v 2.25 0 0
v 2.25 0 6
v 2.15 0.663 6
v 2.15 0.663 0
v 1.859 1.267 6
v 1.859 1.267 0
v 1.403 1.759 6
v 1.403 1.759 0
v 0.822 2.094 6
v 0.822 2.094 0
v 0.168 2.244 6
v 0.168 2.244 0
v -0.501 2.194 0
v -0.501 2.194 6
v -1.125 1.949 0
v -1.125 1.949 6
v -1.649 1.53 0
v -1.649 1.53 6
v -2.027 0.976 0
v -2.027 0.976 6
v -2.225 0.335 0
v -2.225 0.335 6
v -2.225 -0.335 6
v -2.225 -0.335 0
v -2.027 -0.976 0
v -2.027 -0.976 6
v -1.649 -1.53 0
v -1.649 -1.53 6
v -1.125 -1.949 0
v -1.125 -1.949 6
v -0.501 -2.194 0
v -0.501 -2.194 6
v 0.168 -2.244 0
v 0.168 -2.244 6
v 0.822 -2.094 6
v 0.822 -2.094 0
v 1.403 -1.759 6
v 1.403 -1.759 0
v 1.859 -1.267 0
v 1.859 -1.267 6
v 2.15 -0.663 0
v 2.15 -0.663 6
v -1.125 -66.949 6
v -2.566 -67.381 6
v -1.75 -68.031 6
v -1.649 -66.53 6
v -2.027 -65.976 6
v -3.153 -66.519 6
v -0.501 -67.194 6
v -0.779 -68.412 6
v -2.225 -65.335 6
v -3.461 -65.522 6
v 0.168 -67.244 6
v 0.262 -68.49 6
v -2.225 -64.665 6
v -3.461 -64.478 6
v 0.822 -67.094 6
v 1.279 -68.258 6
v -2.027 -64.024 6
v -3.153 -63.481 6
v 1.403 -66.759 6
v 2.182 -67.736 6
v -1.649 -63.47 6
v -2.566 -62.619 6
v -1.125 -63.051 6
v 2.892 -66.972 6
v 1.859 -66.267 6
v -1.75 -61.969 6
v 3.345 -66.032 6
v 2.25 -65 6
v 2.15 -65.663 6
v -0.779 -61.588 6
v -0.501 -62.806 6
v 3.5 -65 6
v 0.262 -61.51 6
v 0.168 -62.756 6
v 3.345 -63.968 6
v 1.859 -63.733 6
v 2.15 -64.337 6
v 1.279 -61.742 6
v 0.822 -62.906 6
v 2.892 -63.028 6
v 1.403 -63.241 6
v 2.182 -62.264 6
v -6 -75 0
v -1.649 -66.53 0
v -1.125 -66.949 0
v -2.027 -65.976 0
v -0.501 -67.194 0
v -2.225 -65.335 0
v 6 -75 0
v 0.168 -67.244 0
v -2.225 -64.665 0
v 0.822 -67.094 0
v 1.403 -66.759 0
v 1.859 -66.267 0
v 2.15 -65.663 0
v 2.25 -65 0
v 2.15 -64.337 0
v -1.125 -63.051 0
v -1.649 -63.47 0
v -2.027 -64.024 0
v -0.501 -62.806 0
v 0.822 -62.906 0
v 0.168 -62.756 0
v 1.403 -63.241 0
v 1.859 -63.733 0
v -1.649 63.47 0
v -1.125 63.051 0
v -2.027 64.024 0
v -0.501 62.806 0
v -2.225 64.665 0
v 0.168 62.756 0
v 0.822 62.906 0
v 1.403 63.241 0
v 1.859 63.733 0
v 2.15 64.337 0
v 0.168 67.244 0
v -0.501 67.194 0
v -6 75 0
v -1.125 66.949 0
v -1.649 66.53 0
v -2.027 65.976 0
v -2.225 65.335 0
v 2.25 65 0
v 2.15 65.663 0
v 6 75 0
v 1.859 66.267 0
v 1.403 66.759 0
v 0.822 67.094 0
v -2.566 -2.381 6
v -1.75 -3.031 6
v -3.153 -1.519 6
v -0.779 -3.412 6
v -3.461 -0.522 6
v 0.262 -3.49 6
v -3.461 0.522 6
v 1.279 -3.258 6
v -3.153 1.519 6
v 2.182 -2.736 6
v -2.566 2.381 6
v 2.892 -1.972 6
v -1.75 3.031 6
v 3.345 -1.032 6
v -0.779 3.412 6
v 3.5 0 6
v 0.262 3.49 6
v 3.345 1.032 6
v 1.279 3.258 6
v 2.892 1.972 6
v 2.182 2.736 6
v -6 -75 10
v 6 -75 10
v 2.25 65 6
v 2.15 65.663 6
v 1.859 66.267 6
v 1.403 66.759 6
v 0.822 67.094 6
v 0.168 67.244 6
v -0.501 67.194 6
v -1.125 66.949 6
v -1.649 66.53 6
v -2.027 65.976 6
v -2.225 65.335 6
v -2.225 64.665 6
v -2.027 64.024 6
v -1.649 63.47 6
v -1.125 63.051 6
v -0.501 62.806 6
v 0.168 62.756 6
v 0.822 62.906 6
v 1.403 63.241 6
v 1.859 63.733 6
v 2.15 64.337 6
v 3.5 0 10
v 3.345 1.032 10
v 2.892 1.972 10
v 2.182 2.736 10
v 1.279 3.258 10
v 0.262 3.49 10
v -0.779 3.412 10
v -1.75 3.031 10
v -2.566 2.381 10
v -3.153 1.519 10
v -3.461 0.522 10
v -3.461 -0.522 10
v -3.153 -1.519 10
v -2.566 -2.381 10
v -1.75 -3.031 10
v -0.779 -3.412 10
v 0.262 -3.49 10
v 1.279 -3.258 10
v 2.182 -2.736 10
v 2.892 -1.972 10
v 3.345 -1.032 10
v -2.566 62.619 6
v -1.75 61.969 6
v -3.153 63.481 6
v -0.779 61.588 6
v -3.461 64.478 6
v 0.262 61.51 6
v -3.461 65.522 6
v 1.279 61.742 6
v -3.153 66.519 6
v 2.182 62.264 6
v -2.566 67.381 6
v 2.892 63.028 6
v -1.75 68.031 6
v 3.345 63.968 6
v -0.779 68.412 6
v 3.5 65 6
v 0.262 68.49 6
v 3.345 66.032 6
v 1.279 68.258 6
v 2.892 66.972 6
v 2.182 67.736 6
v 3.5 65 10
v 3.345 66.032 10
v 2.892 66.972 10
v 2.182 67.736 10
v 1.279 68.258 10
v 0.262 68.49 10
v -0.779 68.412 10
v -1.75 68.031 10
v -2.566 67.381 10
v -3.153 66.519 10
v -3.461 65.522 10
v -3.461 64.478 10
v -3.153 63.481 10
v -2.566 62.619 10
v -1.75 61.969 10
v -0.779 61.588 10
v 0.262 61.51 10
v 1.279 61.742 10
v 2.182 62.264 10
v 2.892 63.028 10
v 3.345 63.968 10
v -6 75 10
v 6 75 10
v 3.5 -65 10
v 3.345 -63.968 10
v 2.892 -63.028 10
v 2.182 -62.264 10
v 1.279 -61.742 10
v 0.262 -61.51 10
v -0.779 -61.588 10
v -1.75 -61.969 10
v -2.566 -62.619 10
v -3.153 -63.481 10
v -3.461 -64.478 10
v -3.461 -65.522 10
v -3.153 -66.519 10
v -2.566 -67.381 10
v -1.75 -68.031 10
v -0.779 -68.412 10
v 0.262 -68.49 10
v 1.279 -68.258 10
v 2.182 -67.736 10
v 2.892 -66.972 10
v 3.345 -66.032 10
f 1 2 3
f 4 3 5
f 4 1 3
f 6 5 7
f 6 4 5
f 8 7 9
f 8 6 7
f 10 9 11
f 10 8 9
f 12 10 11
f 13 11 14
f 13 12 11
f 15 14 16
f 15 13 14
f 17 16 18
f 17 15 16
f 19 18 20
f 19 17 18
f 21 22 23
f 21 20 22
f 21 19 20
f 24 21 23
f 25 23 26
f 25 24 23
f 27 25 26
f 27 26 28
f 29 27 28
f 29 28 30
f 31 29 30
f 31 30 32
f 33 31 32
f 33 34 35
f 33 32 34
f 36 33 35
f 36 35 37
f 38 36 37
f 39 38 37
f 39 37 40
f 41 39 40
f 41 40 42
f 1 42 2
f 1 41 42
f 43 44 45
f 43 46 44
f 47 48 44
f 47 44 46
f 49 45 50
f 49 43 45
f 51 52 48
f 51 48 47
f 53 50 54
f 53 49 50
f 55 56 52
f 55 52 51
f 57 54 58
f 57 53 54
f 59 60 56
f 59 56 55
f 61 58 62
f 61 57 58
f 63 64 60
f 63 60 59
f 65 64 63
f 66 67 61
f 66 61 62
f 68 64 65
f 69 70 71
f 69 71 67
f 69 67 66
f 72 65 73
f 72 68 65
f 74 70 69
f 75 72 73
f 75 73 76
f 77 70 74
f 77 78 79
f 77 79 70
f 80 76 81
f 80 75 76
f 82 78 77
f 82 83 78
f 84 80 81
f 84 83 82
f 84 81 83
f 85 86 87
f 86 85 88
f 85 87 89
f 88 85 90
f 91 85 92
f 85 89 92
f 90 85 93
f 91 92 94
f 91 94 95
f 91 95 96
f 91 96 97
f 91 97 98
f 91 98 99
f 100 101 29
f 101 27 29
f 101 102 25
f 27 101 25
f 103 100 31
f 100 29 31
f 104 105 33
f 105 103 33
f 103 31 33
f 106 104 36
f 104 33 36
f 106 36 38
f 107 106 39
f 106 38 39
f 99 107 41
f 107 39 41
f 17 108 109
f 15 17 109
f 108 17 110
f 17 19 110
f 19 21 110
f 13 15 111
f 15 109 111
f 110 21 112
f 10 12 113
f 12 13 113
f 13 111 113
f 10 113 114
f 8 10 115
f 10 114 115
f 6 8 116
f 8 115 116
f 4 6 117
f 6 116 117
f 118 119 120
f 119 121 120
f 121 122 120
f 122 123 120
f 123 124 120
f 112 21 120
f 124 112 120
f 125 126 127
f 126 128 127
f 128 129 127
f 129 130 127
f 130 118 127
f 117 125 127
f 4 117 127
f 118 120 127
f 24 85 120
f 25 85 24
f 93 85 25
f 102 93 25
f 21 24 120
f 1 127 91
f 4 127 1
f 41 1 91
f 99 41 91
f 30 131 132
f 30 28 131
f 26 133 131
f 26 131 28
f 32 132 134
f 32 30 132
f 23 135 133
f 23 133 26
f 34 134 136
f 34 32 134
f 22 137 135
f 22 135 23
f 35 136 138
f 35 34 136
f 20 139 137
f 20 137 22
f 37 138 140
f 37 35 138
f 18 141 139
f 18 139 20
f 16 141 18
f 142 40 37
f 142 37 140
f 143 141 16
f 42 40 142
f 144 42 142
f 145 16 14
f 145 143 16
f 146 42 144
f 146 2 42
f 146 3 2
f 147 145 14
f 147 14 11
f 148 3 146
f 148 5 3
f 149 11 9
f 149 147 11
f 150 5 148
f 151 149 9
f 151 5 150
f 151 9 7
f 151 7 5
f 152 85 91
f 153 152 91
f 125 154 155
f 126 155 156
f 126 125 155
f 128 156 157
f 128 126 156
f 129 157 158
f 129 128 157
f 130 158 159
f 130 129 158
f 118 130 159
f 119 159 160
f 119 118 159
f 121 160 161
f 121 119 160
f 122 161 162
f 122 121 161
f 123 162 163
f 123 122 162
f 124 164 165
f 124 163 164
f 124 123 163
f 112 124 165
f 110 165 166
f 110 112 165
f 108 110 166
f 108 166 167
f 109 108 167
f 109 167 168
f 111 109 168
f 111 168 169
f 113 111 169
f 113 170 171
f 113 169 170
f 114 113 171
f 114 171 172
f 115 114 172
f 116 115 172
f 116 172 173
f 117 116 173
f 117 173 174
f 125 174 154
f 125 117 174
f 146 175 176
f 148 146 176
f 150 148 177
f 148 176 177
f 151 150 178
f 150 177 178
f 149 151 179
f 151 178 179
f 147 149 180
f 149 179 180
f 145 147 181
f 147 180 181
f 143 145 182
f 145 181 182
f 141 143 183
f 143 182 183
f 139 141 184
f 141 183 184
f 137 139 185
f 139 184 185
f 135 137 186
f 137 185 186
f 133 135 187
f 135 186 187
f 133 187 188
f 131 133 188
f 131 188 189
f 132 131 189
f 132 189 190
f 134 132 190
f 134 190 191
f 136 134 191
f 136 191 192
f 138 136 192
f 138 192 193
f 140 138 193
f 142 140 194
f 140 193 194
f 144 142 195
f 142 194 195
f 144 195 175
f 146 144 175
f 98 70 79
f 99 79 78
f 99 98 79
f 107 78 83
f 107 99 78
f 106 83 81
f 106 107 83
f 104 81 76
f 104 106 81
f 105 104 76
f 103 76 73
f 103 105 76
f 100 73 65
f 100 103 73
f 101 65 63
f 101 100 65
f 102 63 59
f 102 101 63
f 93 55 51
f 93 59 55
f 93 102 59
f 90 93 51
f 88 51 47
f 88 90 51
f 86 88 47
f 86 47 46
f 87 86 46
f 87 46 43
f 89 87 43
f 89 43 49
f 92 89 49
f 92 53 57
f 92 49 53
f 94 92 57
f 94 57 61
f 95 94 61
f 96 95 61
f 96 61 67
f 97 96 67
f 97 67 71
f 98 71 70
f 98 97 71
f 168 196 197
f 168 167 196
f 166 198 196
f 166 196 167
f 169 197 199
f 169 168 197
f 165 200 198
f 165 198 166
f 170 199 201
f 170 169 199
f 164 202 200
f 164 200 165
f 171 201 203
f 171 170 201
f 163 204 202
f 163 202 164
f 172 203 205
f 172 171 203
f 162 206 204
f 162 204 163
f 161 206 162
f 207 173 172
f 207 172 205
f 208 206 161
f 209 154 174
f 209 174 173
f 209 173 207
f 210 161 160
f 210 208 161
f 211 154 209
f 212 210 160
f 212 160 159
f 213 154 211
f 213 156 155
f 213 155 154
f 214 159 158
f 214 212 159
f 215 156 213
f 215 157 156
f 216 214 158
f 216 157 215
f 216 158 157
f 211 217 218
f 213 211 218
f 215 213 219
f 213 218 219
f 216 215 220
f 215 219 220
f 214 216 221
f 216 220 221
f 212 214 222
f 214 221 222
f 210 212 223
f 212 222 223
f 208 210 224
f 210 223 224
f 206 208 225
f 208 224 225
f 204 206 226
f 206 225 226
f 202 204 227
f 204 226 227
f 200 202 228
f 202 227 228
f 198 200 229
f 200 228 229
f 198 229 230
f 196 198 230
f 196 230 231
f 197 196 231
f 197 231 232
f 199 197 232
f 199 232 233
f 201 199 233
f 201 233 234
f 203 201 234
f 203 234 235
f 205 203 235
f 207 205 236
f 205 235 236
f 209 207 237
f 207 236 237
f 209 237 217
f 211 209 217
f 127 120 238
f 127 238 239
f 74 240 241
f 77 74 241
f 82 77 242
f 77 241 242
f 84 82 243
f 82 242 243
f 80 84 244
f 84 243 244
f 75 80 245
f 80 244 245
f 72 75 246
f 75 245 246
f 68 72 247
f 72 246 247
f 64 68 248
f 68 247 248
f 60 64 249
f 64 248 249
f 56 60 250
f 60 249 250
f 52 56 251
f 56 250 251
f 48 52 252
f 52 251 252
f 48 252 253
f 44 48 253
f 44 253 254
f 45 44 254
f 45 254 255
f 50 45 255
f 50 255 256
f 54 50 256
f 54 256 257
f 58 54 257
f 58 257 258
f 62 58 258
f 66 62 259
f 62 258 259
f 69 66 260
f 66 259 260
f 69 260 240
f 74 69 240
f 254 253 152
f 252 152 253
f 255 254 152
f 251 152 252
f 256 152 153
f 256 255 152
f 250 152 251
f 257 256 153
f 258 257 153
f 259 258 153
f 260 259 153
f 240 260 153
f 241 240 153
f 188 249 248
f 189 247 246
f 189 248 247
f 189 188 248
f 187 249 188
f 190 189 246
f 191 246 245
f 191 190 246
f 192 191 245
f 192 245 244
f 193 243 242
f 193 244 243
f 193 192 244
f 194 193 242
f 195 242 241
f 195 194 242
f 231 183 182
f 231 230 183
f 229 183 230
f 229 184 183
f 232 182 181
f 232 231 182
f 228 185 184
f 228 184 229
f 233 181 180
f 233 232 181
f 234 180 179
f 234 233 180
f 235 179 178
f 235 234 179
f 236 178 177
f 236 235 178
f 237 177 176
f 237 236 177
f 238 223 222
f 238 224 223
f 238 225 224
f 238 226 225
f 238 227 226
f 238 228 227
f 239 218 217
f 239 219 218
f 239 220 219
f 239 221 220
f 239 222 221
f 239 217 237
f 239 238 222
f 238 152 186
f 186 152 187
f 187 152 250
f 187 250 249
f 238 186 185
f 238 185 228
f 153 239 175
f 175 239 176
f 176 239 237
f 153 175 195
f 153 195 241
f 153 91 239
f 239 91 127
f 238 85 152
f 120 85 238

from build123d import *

# Parameters (mm, degrees)
CROQUIS1_W              = 12
CROQUIS1_H              = 150
CROQUIS1_R              = 2.25
SALIENTE_EXTRUIR1_DEPTH = 10
CROQUIS2_R              = 3.5
CORTAR_EXTRUIR1_DEPTH   = 4


with BuildPart() as part:
    # Croquis1 → Saliente-Extruir1 (new body)
    with BuildSketch(Plane.XY):
        Rectangle(CROQUIS1_W, CROQUIS1_H)
        with Locations((0, 65)):
            Circle(CROQUIS1_R, mode=Mode.SUBTRACT)
        Circle(CROQUIS1_R, mode=Mode.SUBTRACT)
        with Locations((0, -65)):
            Circle(CROQUIS1_R, mode=Mode.SUBTRACT)
    extrude(amount=SALIENTE_EXTRUIR1_DEPTH)

    # Croquis2 → Cortar-Extruir1 (cut)
    with BuildSketch(Plane.XY.offset(10)):
        with Locations((0, 65)):
            Circle(CROQUIS2_R)
        Circle(CROQUIS2_R)
        with Locations((0, -65)):
            Circle(CROQUIS2_R)
    extrude(amount=-CORTAR_EXTRUIR1_DEPTH, mode=Mode.SUBTRACT)


solid = part.part
